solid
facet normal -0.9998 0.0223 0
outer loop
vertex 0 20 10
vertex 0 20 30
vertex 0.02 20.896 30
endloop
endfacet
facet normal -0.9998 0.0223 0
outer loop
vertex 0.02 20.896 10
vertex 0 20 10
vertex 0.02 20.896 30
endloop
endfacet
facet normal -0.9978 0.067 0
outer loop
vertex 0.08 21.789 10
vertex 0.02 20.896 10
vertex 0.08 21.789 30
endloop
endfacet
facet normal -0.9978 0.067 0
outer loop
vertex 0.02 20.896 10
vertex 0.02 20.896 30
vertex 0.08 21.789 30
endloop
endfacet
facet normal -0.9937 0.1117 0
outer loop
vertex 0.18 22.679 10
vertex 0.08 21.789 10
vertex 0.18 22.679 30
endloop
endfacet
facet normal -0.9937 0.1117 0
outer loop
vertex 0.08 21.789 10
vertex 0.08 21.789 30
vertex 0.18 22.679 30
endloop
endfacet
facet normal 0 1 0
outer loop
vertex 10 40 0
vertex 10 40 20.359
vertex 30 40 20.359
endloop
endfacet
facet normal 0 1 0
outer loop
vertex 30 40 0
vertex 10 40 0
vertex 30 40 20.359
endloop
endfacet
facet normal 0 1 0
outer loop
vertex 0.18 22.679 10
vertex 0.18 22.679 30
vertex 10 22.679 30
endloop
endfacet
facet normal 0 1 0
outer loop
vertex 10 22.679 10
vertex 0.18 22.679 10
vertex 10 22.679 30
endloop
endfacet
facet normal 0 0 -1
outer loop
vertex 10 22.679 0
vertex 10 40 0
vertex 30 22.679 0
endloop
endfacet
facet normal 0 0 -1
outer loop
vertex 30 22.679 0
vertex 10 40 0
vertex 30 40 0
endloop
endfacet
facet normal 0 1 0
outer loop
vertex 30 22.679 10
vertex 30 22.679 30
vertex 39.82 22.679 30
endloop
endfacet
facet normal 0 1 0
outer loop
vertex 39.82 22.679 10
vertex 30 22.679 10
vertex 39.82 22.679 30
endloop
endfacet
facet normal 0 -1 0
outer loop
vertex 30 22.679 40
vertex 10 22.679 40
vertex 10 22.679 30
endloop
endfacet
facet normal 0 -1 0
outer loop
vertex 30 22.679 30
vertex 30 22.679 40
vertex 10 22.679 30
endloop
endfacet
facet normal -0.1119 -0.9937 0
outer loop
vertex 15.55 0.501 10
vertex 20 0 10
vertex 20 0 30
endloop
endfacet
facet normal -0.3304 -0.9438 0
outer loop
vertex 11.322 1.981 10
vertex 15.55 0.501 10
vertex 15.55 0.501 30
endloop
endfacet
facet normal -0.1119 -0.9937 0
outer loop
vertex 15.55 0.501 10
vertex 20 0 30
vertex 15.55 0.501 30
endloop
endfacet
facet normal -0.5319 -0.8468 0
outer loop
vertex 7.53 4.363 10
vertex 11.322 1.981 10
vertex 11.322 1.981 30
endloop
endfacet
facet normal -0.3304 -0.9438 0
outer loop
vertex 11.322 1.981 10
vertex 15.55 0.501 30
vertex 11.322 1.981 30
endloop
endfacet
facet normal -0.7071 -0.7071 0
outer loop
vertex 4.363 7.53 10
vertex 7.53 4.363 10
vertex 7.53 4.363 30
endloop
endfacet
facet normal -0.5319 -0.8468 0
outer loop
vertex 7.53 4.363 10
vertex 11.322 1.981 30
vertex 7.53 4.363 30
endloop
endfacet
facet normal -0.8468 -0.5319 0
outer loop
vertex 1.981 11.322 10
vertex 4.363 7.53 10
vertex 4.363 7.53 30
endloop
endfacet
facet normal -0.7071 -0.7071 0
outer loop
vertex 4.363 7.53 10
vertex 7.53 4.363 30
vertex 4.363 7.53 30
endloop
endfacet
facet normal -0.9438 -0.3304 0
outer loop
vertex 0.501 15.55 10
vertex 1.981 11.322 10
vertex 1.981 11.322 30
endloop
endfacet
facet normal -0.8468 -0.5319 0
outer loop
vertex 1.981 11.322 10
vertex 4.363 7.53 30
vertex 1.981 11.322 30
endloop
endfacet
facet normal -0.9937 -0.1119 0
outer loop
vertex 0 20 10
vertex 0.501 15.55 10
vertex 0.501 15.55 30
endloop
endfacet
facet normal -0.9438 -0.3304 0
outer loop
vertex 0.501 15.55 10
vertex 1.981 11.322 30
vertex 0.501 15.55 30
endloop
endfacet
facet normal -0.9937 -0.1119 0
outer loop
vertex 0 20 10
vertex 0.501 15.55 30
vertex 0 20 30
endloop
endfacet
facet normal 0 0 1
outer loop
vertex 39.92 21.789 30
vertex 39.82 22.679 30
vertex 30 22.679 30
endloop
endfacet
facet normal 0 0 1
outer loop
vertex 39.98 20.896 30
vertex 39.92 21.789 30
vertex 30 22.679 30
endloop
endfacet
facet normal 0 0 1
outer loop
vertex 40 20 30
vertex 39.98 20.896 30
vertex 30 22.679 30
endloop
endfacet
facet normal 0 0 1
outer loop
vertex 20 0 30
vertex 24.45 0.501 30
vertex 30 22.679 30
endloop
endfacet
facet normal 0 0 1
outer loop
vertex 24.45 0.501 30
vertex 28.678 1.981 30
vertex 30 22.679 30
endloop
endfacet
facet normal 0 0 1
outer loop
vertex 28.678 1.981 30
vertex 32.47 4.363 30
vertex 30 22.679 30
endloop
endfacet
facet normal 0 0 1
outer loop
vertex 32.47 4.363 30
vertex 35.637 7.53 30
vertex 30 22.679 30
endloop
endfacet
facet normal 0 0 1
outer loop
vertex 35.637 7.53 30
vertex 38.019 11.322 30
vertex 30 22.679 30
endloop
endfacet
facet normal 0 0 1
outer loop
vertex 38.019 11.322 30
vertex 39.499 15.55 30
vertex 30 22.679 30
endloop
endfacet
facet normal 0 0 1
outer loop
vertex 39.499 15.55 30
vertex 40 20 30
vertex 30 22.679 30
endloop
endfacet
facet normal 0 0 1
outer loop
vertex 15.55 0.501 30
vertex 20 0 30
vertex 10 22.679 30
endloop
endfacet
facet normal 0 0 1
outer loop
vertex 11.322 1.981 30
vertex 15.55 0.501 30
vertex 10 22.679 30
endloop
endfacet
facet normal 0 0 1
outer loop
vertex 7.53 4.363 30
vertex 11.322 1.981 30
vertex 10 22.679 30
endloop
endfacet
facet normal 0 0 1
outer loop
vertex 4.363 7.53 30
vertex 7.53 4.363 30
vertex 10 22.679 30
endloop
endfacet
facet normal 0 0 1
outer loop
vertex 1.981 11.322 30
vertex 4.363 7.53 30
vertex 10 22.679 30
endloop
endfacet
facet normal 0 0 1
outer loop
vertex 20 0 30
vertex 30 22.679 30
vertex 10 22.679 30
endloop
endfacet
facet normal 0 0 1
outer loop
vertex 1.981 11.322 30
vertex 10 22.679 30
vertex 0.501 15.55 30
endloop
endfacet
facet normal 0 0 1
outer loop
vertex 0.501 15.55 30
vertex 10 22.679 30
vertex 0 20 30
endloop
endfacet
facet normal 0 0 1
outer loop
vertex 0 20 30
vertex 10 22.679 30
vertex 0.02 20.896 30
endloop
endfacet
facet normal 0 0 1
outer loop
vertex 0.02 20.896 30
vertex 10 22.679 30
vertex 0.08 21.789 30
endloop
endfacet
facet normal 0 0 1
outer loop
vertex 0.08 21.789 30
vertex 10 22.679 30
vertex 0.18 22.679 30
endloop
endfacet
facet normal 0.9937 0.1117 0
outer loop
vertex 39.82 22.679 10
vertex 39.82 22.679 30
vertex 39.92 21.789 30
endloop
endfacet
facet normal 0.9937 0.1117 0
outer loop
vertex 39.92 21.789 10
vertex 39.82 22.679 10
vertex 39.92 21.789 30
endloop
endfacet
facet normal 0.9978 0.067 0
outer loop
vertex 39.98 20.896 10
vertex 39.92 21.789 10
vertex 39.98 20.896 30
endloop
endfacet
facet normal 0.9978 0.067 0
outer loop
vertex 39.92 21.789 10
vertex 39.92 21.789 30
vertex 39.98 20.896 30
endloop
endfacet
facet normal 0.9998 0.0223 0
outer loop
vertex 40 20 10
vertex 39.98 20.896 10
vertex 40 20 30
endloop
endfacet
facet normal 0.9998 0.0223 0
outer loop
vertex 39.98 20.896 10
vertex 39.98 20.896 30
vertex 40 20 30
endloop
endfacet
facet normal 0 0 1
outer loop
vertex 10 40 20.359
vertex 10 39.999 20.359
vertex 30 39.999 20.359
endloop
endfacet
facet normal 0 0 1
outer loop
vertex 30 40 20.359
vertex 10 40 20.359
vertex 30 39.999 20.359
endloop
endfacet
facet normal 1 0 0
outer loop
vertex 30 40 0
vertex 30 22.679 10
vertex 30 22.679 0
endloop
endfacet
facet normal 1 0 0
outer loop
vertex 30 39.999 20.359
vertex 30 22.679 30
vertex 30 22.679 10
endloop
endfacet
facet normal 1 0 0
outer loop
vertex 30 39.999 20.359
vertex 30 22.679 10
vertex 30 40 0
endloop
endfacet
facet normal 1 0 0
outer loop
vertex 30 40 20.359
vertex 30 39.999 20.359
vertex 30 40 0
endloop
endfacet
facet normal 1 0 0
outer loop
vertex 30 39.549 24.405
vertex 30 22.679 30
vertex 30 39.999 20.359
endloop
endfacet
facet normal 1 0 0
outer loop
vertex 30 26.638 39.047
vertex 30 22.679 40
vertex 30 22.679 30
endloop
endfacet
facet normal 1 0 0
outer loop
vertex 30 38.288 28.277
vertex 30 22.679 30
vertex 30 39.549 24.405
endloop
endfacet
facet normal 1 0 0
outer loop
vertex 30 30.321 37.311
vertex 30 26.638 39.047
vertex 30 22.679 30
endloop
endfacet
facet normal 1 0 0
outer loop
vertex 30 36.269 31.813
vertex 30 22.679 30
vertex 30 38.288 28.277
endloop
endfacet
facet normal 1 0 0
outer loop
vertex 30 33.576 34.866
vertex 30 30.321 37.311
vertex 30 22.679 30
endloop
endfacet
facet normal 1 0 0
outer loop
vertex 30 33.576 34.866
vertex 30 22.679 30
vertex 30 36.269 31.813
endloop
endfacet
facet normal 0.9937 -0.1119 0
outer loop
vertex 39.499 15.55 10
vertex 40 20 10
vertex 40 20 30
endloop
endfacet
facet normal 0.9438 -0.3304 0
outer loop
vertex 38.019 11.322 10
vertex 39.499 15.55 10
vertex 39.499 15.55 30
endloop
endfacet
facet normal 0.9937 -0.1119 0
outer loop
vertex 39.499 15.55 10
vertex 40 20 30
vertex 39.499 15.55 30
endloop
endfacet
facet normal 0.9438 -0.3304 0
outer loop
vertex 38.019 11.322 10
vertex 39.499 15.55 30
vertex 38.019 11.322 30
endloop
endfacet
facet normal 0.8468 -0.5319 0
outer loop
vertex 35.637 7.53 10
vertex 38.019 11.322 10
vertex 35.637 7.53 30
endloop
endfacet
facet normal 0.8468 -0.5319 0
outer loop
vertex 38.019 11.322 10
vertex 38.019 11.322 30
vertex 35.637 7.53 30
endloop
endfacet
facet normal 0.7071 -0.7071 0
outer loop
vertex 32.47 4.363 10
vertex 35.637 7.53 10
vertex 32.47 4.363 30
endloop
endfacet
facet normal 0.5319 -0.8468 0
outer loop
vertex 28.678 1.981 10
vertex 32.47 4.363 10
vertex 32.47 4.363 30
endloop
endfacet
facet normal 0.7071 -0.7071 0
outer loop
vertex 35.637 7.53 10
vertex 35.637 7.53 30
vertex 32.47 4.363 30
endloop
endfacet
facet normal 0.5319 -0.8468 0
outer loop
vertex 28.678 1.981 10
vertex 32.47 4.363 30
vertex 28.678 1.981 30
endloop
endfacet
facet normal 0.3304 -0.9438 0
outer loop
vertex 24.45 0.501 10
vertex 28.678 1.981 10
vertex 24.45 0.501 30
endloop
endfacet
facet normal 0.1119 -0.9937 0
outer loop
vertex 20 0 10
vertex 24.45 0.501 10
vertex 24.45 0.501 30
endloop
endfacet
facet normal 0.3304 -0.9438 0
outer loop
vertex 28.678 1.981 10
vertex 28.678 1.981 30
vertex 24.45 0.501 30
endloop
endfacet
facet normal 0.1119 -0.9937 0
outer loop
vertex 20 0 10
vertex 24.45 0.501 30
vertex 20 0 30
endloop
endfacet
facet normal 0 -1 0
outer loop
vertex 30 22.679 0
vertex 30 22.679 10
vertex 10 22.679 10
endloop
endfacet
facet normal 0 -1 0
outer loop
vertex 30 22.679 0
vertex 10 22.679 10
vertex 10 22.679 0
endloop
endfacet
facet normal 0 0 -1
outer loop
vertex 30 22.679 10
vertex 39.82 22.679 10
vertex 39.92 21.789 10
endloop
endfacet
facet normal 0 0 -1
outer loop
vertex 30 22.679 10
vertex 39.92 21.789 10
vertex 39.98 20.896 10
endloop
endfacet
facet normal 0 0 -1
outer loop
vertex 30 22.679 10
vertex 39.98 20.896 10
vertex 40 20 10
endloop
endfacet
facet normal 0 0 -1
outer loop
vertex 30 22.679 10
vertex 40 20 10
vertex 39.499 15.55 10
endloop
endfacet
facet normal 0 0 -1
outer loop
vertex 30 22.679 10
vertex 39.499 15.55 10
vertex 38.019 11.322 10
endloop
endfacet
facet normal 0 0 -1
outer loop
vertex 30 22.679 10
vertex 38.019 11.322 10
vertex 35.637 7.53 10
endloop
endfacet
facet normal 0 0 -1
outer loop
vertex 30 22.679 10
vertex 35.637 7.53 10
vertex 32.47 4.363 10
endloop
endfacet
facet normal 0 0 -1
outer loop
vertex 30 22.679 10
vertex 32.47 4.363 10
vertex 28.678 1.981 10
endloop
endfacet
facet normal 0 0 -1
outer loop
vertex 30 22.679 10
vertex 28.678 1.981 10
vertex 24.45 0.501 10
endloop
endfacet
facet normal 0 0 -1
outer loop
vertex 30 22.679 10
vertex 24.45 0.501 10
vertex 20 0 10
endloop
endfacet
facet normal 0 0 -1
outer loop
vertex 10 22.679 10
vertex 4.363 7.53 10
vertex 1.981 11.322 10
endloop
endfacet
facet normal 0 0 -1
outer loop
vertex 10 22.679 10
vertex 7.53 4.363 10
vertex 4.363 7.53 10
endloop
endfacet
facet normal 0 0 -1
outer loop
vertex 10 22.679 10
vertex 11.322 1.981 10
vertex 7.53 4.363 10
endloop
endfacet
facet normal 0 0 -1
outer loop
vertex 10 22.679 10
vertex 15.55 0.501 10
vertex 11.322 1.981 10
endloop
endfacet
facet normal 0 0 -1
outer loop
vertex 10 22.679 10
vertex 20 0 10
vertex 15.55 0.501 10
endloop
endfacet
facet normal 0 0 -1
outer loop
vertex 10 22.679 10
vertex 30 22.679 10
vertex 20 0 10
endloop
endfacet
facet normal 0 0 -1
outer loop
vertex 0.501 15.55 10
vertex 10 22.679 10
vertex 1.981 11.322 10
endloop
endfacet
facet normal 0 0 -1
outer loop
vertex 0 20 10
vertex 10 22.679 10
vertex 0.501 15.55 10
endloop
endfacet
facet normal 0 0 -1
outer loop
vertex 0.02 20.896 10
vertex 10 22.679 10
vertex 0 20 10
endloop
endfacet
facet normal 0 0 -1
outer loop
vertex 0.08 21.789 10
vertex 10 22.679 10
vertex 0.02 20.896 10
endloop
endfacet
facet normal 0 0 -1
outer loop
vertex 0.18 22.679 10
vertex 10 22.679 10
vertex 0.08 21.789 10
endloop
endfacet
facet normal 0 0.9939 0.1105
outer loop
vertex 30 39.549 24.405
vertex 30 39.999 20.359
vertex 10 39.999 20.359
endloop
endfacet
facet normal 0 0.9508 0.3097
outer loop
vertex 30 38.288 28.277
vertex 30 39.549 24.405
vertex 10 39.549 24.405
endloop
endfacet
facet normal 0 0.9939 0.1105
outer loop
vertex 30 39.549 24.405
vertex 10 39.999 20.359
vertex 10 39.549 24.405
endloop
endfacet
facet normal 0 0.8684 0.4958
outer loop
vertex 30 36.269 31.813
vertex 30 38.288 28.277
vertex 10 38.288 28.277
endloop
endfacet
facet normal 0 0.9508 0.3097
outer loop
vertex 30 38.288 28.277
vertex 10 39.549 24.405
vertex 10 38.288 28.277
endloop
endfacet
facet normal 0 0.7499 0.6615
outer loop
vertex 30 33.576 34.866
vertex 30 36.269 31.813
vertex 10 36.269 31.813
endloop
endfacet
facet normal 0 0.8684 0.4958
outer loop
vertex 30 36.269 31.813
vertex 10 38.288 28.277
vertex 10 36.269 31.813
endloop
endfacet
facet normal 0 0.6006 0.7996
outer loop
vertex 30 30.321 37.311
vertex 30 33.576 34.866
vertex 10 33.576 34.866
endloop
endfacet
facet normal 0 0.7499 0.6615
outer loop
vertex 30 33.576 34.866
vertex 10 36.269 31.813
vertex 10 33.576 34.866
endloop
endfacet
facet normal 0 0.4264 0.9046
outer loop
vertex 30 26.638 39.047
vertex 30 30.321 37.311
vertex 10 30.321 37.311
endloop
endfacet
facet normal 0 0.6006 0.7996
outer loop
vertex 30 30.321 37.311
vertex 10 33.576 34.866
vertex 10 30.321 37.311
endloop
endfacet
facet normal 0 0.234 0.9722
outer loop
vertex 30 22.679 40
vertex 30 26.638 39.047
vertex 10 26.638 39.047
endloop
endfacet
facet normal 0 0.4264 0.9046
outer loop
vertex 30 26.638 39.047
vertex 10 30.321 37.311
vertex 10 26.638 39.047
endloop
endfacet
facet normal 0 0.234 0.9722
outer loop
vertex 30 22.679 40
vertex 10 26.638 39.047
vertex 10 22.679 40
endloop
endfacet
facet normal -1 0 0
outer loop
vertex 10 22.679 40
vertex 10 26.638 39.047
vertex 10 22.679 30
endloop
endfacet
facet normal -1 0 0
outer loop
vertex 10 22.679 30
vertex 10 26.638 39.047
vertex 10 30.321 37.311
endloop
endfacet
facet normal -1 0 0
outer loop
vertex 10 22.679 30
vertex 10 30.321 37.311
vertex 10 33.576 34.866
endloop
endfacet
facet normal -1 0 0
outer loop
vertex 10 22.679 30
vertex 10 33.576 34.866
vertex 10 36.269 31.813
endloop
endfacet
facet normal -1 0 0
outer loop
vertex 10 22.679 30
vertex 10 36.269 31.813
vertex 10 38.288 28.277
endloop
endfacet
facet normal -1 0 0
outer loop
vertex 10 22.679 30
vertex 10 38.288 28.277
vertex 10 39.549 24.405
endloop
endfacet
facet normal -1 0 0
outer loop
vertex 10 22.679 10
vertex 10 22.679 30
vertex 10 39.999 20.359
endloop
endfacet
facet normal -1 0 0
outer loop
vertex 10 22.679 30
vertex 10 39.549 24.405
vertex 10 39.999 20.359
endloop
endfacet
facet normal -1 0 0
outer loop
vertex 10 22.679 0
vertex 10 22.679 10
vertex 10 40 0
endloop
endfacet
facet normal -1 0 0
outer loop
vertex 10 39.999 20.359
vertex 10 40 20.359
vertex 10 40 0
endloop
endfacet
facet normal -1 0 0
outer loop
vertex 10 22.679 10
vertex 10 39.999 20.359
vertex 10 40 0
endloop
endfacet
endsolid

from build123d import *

# Parameters (mm, degrees)
SKETCH1_W           = 40
SKETCH1_H           = 40
BOSS_EXTRUDE1_DEPTH = 40
SKETCH2_W           = 10
SKETCH2_H           = 20
CUT_EXTRUDE1_DEPTH  = 40
SKETCH3_W           = 10
SKETCH3_H           = 10
CUT_EXTRUDE2_DEPTH  = 40
CUT_EXTRUDE3_DEPTH  = 40
SKETCH5_W           = 20
SKETCH5_H           = 10
CUT_EXTRUDE4_DEPTH  = 40
SKETCH6_W           = 20
SKETCH6_H           = 19.641016119
CUT_EXTRUDE5_DEPTH  = 40
BOSS_EXTRUDE2_DEPTH = 20


with BuildPart() as part:
    # Sketch1 → Boss-Extrude1 (new body)
    with BuildSketch(Plane.XY):
        with Locations((20, 20)):
            Rectangle(SKETCH1_W, SKETCH1_H)
    extrude(amount=BOSS_EXTRUDE1_DEPTH)

    # Sketch2 → Cut-Extrude1 (cut)
    with BuildSketch(Plane.XY.offset(40)):
        with BuildLine():
            ThreePointArc((20, 0), (5.857864376, 5.857864376), (0, 20))
            Line((0, 20), (0, 0))
            Line((0, 0), (20, 0))
        make_face()
        with BuildLine():
            ThreePointArc((40, 20), (34.142135624, 5.857864376), (20, 0))
            Line((20, 0), (40, 0))
            Line((40, 0), (40, 20))
        make_face()
        with Locations((35, 30)):
            Rectangle(SKETCH2_W, SKETCH2_H)
        with Locations((5, 30)):
            Rectangle(SKETCH2_W, SKETCH2_H)
    extrude(amount=-CUT_EXTRUDE1_DEPTH, mode=Mode.SUBTRACT)

    # Sketch3 → Cut-Extrude2 (cut)
    with BuildSketch(Plane(origin=(0, 20, 0), x_dir=(1, 0, 0), z_dir=(0, 1, 0))):
        with Locations((5, -5)):
            Rectangle(SKETCH3_W, SKETCH3_H)
        with Locations((35, -5)):
            Rectangle(SKETCH3_W, SKETCH3_H)
        with Locations((35, -35)):
            Rectangle(SKETCH3_W, SKETCH3_H)
        with Locations((5, -35)):
            Rectangle(SKETCH3_W, SKETCH3_H)
    extrude(amount=-CUT_EXTRUDE2_DEPTH, mode=Mode.SUBTRACT)

    # Sketch4 → Cut-Extrude3 (cut)
    with BuildSketch(Plane.ZY.offset(-10)):
        Polygon((10, 22.679491924), (0, 22.679491924), (0, 2.679491924), (10, 2.679491924), (10, 20), align=None)
        Polygon((30, 2.679491924), (40, 2.679491924), (40, 22.679491924), (30, 22.679491924), (30, 20), align=None)
        with BuildLine():
            ThreePointArc((20.358983897, 39.999201827), (33.408185604, 35.000772179), (40, 22.679491924))
            Line((40, 22.679491924), (40, 40))
            Line((40, 40), (20.358983897, 39.999201827))
        make_face()
    extrude(amount=-CUT_EXTRUDE3_DEPTH, mode=Mode.SUBTRACT)

    # Sketch5 → Cut-Extrude4 (cut)
    with BuildSketch(Plane(origin=(0, 2.679491924, 0), x_dir=(1, 0, 0), z_dir=(0, 1, 0))):
        with Locations((20, -5)):
            Rectangle(SKETCH5_W, SKETCH5_H)
        with Locations((20, -35)):
            Rectangle(SKETCH5_W, SKETCH5_H)
    extrude(amount=-CUT_EXTRUDE4_DEPTH, mode=Mode.SUBTRACT)

    # Sketch6 → Cut-Extrude5 (cut)
    with BuildSketch(Plane(origin=(0, 39.998374412, -0.001625456), x_dir=(1, 0, 0), z_dir=(0, -0.999999999, 4.0638e-05))):
        with Locations((20, 30.18111743)):
            Rectangle(SKETCH6_W, SKETCH6_H)
    extrude(amount=-CUT_EXTRUDE5_DEPTH, mode=Mode.SUBTRACT)

    # Sketch8 → Boss-Extrude2 (add)
    with BuildSketch(Plane.XY.offset(30)):
        with BuildLine():
            Line((0.180304669, 22.679491924), (39.819695331, 22.679491924))
            ThreePointArc((39.819695331, 22.679491924), (20, 0), (0.180304669, 22.679491924))
        make_face()
    extrude(amount=-BOSS_EXTRUDE2_DEPTH)


solid = part.part
